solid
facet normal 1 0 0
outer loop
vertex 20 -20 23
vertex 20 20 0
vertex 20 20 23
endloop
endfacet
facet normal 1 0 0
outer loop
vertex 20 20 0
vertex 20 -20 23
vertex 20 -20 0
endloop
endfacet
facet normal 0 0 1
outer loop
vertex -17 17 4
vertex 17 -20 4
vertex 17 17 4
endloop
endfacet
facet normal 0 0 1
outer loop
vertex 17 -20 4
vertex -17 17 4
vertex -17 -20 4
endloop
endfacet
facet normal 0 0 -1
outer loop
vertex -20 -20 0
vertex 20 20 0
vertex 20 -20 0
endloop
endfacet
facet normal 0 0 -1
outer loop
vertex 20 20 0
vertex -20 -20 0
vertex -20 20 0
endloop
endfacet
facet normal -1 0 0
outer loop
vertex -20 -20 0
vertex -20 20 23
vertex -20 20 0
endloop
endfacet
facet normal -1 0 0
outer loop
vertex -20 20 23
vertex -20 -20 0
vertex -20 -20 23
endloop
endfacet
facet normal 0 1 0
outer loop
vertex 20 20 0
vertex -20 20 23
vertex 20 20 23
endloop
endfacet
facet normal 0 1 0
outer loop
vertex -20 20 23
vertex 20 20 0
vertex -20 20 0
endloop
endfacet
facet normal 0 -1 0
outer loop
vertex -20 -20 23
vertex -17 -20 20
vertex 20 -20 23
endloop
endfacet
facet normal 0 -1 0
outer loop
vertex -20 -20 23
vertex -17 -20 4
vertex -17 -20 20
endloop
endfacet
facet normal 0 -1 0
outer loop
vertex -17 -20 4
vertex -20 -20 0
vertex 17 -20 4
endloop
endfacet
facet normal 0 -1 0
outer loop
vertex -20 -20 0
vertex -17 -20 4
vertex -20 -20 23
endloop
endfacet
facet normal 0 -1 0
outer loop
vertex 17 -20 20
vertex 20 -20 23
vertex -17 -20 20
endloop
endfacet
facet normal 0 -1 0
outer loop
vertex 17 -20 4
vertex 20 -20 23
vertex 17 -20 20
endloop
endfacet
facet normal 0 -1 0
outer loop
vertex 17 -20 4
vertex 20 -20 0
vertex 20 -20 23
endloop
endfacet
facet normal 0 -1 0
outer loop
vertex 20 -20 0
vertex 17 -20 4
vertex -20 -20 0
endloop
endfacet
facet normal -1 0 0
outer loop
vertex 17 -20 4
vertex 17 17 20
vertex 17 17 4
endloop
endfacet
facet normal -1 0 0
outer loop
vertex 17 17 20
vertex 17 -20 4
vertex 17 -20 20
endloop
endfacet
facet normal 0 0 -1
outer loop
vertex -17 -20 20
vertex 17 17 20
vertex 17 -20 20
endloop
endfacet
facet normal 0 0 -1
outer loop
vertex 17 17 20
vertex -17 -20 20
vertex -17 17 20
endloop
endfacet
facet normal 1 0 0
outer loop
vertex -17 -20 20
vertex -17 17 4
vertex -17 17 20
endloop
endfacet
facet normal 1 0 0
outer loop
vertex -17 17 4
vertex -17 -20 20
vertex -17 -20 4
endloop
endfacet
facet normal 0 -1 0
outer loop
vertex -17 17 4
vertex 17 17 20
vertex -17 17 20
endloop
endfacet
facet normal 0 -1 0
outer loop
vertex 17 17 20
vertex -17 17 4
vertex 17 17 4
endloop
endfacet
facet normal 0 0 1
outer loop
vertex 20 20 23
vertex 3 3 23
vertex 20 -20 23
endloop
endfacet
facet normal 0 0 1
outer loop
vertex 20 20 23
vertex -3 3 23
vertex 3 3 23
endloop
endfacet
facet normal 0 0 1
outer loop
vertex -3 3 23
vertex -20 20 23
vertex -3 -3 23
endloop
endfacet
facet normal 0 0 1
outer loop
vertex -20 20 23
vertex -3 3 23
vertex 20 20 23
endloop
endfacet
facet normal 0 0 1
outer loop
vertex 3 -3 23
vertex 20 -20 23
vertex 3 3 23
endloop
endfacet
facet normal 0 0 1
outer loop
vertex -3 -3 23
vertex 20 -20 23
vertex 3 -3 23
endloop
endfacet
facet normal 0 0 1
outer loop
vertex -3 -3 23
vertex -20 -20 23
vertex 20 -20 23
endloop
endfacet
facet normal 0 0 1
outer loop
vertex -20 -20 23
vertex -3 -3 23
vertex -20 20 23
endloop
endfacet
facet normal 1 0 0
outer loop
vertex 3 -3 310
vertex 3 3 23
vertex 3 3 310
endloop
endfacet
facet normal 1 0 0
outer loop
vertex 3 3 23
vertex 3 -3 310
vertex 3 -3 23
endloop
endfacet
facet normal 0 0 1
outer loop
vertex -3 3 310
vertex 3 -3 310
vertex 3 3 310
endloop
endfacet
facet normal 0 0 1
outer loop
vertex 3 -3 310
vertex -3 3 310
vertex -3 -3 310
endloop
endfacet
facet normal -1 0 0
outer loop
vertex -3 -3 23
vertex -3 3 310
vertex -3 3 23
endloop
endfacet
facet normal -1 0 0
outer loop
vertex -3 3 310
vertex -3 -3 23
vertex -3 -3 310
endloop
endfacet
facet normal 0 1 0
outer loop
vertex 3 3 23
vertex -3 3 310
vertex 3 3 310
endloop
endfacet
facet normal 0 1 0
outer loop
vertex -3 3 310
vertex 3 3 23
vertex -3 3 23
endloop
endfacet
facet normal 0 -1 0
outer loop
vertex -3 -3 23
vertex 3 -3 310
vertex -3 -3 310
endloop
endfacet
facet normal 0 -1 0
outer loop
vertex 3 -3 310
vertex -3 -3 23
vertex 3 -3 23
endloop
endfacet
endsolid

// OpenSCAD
// file: sampler.scad
// Original task reconstruction,MIT license. Units:mm.
// Select part; F6 render; exportSTL. Standard hardware specified inREADME.
part = "Outer";
$fn=64;
module Outer() { union() {
  translate([0.0, -22.5, 20.5]) cube([48.0, 3.0, 29.0],center=true);
  polyhedron(points=[[-24.0, -24.0, 0.0], [-24.0, -24.0, 6.0], [-24.0, -21.0, 6.0], [24.0, -24.0, 0.0], [24.0, -24.0, 6.0], [24.0, -21.0, 6.0]],faces=[[2, 1, 0], [4, 5, 3], [4, 3, 0], [1, 4, 0], [5, 4, 1], [2, 5, 1], [5, 2, 0], [3, 5, 0]],convexity=10);
  translate([0.0, 22.5, 17.5]) cube([48.0, 3.0, 35.0],center=true);
  translate([-22.5, 0.0, 17.5]) cube([3.0, 42.0, 35.0],center=true);
  translate([-15.5, 0.0, 36.5]) cube([17.0, 48.0, 3.0],center=true);
  translate([0.0, -15.5, 36.5]) cube([14.0, 17.0, 3.0],center=true);
  translate([-8.0, 0.0, 154.0]) cube([2.0, 18.0, 232.0],center=true);
  translate([0.0, -8.0, 154.0]) cube([14.0, 2.0, 232.0],center=true);
  translate([22.5, 0.0, 17.5]) cube([3.0, 42.0, 35.0],center=true);
  translate([15.5, 0.0, 36.5]) cube([17.0, 48.0, 3.0],center=true);
  translate([0.0, 15.5, 36.5]) cube([14.0, 17.0, 3.0],center=true);
  translate([8.0, 0.0, 154.0]) cube([2.0, 18.0, 232.0],center=true);
  translate([0.0, 8.0, 154.0]) cube([14.0, 2.0, 232.0],center=true);
  translate([-10.0, 0.0, 180.0]) cube([4.0, 24.0, 80.0],center=true);
  translate([0.0, -10.0, 180.0]) cube([16.0, 4.0, 80.0],center=true);
  translate([10.0, 0.0, 180.0]) cube([4.0, 24.0, 80.0],center=true);
  translate([0.0, 10.0, 180.0]) cube([16.0, 4.0, 80.0],center=true);
  translate([-5.125, 0.0, 43.0]) cube([3.75, 14.0, 10.0],center=true);
  translate([0.0, -5.125, 43.0]) cube([6.5, 3.75, 10.0],center=true);
  translate([5.125, 0.0, 43.0]) cube([3.75, 14.0, 10.0],center=true);
  translate([0.0, 5.125, 43.0]) cube([6.5, 3.75, 10.0],center=true);
  translate([-5.125, 0.0, 260.0]) cube([3.75, 14.0, 10.0],center=true);
  translate([0.0, -5.125, 260.0]) cube([6.5, 3.75, 10.0],center=true);
  translate([5.125, 0.0, 260.0]) cube([3.75, 14.0, 10.0],center=true);
  translate([0.0, 5.125, 260.0]) cube([6.5, 3.75, 10.0],center=true);
  translate([-12.5, 0.0, 194.0]) cube([11.0, 36.0, 4.0],center=true);
  translate([0.0, -12.5, 194.0]) cube([14.0, 11.0, 4.0],center=true);
  translate([12.5, 0.0, 194.0]) cube([11.0, 36.0, 4.0],center=true);
  translate([0.0, 12.5, 194.0]) cube([14.0, 11.0, 4.0],center=true);
} }
if(part=="Outer") Outer();
module Rod() { union() {
  translate([0.0, 0.0, 2.0]) cube([40.0, 40.0, 4.0],center=true);
  translate([0.0, 18.5, 10.0]) cube([34.0, 3.0, 20.0],center=true);
  translate([-18.5, 0.0, 10.0]) cube([3.0, 40.0, 20.0],center=true);
  translate([18.5, 0.0, 10.0]) cube([3.0, 40.0, 20.0],center=true);
  translate([0.0, 0.0, 21.5]) cube([40.0, 40.0, 3.0],center=true);
  translate([0.0, 0.0, 166.5]) cube([6.0, 6.0, 287.0],center=true);
  translate([0.0, 0.0, 310.0]) cylinder(r=15,h=10,center=true);
} }
if(part=="Rod") Rod();
module Source() { union() {
  translate([0.0, 0.0, 2.0]) cube([111.0, 111.0, 3.0],center=true);
  translate([-54.0, 0.0, 76.0]) cube([3.0, 111.0, 145.0],center=true);
  translate([0.0, -54.0, 76.0]) cube([105.0, 3.0, 145.0],center=true);
  translate([54.0, 0.0, 76.0]) cube([3.0, 111.0, 145.0],center=true);
  translate([0.0, 54.0, 76.0]) cube([105.0, 3.0, 145.0],center=true);
} }
if(part=="Source") Source();
module Jar() { union() {
  translate([0.0, 0.0, 2.0]) cube([116.0, 116.0, 3.0],center=true);
  translate([-56.5, 0.0, 51.0]) cube([3.0, 116.0, 95.0],center=true);
  translate([0.0, -56.5, 51.0]) cube([110.0, 3.0, 95.0],center=true);
  translate([56.5, 0.0, 51.0]) cube([3.0, 116.0, 95.0],center=true);
  translate([0.0, 56.5, 51.0]) cube([110.0, 3.0, 95.0],center=true);
} }
if(part=="Jar") Jar();
module Stand() { union() {
  translate([0.0, 0.0, -3.0]) cube([116.0, 116.0, 6.0],center=true);
  translate([-52.0, 0.0, 15.0]) cube([4.0, 108.0, 30.0],center=true);
  translate([52.0, 0.0, 15.0]) cube([4.0, 108.0, 30.0],center=true);
  translate([0.0, -52.0, 15.0]) cube([108.0, 4.0, 30.0],center=true);
  translate([0.0, 52.0, 15.0]) cube([108.0, 4.0, 30.0],center=true);
} }
if(part=="Stand") Stand();
module Containment() { union() {
  translate([0.0, 0.0, 1.0]) cube([526.0, 626.0, 3.0],center=true);
  translate([-261.5, 0.0, 27.5]) cube([3.0, 626.0, 50.0],center=true);
  translate([0.0, -311.5, 27.5]) cube([520.0, 3.0, 50.0],center=true);
  translate([261.5, 0.0, 27.5]) cube([3.0, 626.0, 50.0],center=true);
  translate([0.0, 311.5, 27.5]) cube([520.0, 3.0, 50.0],center=true);
  translate([0.0, 0.0, -0.5]) cube([526.0, 626.0, 8.0],center=true);
} }
if(part=="Containment") Containment();
if(part=="granule") sphere(r=3.4);
// main file
// Assembly components for the supplied sampler model. Units:mm; MIT.
use <sampler.scad>
part="RodCore";
$fn=64;
module RodCore(){ union(){
translate([0.0, 0.0, 2.0]) cube([40.0, 40.0, 4.0],center=true);
translate([0.0, 18.5, 10.0]) cube([34.0, 3.0, 20.0],center=true);
translate([-18.5, 0.0, 10.0]) cube([3.0, 40.0, 20.0],center=true);
translate([18.5, 0.0, 10.0]) cube([3.0, 40.0, 20.0],center=true);
translate([0.0, 0.0, 21.5]) cube([40.0, 40.0, 3.0],center=true);
translate([0.0, 0.0, 166.5]) cube([6.0, 6.0, 287.0],center=true);
}}
module Button(){difference(){translate([0,0,310]) cylinder(r=15,h=10,center=true);translate([0,0,307.45]) cube([6.5,6.5,5.1],center=true);}}
module StopCollar(){difference(){translate([0,0,253]) cube([10,10,4],center=true);translate([0,0,253]) cube([6.3,6.3,4.2],center=true);}}
module StrokeSpacer(){difference(){translate([0,0,275]) cylinder(r=7,h=10,center=true);translate([0,0,275]) cylinder(r=6,h=10.2,center=true);}}
if(part=="RodCore") RodCore();
if(part=="Button") Button();
if(part=="StopCollar") StopCollar();
if(part=="StrokeSpacer") StrokeSpacer();
if(part=="OuterLeft") intersection(){Outer();translate([-1000,-1000,-1000]) cube([1000,2000,2000]);}
if(part=="OuterRight") intersection(){Outer();translate([0,-1000,-1000]) cube([1000,2000,2000]);}
